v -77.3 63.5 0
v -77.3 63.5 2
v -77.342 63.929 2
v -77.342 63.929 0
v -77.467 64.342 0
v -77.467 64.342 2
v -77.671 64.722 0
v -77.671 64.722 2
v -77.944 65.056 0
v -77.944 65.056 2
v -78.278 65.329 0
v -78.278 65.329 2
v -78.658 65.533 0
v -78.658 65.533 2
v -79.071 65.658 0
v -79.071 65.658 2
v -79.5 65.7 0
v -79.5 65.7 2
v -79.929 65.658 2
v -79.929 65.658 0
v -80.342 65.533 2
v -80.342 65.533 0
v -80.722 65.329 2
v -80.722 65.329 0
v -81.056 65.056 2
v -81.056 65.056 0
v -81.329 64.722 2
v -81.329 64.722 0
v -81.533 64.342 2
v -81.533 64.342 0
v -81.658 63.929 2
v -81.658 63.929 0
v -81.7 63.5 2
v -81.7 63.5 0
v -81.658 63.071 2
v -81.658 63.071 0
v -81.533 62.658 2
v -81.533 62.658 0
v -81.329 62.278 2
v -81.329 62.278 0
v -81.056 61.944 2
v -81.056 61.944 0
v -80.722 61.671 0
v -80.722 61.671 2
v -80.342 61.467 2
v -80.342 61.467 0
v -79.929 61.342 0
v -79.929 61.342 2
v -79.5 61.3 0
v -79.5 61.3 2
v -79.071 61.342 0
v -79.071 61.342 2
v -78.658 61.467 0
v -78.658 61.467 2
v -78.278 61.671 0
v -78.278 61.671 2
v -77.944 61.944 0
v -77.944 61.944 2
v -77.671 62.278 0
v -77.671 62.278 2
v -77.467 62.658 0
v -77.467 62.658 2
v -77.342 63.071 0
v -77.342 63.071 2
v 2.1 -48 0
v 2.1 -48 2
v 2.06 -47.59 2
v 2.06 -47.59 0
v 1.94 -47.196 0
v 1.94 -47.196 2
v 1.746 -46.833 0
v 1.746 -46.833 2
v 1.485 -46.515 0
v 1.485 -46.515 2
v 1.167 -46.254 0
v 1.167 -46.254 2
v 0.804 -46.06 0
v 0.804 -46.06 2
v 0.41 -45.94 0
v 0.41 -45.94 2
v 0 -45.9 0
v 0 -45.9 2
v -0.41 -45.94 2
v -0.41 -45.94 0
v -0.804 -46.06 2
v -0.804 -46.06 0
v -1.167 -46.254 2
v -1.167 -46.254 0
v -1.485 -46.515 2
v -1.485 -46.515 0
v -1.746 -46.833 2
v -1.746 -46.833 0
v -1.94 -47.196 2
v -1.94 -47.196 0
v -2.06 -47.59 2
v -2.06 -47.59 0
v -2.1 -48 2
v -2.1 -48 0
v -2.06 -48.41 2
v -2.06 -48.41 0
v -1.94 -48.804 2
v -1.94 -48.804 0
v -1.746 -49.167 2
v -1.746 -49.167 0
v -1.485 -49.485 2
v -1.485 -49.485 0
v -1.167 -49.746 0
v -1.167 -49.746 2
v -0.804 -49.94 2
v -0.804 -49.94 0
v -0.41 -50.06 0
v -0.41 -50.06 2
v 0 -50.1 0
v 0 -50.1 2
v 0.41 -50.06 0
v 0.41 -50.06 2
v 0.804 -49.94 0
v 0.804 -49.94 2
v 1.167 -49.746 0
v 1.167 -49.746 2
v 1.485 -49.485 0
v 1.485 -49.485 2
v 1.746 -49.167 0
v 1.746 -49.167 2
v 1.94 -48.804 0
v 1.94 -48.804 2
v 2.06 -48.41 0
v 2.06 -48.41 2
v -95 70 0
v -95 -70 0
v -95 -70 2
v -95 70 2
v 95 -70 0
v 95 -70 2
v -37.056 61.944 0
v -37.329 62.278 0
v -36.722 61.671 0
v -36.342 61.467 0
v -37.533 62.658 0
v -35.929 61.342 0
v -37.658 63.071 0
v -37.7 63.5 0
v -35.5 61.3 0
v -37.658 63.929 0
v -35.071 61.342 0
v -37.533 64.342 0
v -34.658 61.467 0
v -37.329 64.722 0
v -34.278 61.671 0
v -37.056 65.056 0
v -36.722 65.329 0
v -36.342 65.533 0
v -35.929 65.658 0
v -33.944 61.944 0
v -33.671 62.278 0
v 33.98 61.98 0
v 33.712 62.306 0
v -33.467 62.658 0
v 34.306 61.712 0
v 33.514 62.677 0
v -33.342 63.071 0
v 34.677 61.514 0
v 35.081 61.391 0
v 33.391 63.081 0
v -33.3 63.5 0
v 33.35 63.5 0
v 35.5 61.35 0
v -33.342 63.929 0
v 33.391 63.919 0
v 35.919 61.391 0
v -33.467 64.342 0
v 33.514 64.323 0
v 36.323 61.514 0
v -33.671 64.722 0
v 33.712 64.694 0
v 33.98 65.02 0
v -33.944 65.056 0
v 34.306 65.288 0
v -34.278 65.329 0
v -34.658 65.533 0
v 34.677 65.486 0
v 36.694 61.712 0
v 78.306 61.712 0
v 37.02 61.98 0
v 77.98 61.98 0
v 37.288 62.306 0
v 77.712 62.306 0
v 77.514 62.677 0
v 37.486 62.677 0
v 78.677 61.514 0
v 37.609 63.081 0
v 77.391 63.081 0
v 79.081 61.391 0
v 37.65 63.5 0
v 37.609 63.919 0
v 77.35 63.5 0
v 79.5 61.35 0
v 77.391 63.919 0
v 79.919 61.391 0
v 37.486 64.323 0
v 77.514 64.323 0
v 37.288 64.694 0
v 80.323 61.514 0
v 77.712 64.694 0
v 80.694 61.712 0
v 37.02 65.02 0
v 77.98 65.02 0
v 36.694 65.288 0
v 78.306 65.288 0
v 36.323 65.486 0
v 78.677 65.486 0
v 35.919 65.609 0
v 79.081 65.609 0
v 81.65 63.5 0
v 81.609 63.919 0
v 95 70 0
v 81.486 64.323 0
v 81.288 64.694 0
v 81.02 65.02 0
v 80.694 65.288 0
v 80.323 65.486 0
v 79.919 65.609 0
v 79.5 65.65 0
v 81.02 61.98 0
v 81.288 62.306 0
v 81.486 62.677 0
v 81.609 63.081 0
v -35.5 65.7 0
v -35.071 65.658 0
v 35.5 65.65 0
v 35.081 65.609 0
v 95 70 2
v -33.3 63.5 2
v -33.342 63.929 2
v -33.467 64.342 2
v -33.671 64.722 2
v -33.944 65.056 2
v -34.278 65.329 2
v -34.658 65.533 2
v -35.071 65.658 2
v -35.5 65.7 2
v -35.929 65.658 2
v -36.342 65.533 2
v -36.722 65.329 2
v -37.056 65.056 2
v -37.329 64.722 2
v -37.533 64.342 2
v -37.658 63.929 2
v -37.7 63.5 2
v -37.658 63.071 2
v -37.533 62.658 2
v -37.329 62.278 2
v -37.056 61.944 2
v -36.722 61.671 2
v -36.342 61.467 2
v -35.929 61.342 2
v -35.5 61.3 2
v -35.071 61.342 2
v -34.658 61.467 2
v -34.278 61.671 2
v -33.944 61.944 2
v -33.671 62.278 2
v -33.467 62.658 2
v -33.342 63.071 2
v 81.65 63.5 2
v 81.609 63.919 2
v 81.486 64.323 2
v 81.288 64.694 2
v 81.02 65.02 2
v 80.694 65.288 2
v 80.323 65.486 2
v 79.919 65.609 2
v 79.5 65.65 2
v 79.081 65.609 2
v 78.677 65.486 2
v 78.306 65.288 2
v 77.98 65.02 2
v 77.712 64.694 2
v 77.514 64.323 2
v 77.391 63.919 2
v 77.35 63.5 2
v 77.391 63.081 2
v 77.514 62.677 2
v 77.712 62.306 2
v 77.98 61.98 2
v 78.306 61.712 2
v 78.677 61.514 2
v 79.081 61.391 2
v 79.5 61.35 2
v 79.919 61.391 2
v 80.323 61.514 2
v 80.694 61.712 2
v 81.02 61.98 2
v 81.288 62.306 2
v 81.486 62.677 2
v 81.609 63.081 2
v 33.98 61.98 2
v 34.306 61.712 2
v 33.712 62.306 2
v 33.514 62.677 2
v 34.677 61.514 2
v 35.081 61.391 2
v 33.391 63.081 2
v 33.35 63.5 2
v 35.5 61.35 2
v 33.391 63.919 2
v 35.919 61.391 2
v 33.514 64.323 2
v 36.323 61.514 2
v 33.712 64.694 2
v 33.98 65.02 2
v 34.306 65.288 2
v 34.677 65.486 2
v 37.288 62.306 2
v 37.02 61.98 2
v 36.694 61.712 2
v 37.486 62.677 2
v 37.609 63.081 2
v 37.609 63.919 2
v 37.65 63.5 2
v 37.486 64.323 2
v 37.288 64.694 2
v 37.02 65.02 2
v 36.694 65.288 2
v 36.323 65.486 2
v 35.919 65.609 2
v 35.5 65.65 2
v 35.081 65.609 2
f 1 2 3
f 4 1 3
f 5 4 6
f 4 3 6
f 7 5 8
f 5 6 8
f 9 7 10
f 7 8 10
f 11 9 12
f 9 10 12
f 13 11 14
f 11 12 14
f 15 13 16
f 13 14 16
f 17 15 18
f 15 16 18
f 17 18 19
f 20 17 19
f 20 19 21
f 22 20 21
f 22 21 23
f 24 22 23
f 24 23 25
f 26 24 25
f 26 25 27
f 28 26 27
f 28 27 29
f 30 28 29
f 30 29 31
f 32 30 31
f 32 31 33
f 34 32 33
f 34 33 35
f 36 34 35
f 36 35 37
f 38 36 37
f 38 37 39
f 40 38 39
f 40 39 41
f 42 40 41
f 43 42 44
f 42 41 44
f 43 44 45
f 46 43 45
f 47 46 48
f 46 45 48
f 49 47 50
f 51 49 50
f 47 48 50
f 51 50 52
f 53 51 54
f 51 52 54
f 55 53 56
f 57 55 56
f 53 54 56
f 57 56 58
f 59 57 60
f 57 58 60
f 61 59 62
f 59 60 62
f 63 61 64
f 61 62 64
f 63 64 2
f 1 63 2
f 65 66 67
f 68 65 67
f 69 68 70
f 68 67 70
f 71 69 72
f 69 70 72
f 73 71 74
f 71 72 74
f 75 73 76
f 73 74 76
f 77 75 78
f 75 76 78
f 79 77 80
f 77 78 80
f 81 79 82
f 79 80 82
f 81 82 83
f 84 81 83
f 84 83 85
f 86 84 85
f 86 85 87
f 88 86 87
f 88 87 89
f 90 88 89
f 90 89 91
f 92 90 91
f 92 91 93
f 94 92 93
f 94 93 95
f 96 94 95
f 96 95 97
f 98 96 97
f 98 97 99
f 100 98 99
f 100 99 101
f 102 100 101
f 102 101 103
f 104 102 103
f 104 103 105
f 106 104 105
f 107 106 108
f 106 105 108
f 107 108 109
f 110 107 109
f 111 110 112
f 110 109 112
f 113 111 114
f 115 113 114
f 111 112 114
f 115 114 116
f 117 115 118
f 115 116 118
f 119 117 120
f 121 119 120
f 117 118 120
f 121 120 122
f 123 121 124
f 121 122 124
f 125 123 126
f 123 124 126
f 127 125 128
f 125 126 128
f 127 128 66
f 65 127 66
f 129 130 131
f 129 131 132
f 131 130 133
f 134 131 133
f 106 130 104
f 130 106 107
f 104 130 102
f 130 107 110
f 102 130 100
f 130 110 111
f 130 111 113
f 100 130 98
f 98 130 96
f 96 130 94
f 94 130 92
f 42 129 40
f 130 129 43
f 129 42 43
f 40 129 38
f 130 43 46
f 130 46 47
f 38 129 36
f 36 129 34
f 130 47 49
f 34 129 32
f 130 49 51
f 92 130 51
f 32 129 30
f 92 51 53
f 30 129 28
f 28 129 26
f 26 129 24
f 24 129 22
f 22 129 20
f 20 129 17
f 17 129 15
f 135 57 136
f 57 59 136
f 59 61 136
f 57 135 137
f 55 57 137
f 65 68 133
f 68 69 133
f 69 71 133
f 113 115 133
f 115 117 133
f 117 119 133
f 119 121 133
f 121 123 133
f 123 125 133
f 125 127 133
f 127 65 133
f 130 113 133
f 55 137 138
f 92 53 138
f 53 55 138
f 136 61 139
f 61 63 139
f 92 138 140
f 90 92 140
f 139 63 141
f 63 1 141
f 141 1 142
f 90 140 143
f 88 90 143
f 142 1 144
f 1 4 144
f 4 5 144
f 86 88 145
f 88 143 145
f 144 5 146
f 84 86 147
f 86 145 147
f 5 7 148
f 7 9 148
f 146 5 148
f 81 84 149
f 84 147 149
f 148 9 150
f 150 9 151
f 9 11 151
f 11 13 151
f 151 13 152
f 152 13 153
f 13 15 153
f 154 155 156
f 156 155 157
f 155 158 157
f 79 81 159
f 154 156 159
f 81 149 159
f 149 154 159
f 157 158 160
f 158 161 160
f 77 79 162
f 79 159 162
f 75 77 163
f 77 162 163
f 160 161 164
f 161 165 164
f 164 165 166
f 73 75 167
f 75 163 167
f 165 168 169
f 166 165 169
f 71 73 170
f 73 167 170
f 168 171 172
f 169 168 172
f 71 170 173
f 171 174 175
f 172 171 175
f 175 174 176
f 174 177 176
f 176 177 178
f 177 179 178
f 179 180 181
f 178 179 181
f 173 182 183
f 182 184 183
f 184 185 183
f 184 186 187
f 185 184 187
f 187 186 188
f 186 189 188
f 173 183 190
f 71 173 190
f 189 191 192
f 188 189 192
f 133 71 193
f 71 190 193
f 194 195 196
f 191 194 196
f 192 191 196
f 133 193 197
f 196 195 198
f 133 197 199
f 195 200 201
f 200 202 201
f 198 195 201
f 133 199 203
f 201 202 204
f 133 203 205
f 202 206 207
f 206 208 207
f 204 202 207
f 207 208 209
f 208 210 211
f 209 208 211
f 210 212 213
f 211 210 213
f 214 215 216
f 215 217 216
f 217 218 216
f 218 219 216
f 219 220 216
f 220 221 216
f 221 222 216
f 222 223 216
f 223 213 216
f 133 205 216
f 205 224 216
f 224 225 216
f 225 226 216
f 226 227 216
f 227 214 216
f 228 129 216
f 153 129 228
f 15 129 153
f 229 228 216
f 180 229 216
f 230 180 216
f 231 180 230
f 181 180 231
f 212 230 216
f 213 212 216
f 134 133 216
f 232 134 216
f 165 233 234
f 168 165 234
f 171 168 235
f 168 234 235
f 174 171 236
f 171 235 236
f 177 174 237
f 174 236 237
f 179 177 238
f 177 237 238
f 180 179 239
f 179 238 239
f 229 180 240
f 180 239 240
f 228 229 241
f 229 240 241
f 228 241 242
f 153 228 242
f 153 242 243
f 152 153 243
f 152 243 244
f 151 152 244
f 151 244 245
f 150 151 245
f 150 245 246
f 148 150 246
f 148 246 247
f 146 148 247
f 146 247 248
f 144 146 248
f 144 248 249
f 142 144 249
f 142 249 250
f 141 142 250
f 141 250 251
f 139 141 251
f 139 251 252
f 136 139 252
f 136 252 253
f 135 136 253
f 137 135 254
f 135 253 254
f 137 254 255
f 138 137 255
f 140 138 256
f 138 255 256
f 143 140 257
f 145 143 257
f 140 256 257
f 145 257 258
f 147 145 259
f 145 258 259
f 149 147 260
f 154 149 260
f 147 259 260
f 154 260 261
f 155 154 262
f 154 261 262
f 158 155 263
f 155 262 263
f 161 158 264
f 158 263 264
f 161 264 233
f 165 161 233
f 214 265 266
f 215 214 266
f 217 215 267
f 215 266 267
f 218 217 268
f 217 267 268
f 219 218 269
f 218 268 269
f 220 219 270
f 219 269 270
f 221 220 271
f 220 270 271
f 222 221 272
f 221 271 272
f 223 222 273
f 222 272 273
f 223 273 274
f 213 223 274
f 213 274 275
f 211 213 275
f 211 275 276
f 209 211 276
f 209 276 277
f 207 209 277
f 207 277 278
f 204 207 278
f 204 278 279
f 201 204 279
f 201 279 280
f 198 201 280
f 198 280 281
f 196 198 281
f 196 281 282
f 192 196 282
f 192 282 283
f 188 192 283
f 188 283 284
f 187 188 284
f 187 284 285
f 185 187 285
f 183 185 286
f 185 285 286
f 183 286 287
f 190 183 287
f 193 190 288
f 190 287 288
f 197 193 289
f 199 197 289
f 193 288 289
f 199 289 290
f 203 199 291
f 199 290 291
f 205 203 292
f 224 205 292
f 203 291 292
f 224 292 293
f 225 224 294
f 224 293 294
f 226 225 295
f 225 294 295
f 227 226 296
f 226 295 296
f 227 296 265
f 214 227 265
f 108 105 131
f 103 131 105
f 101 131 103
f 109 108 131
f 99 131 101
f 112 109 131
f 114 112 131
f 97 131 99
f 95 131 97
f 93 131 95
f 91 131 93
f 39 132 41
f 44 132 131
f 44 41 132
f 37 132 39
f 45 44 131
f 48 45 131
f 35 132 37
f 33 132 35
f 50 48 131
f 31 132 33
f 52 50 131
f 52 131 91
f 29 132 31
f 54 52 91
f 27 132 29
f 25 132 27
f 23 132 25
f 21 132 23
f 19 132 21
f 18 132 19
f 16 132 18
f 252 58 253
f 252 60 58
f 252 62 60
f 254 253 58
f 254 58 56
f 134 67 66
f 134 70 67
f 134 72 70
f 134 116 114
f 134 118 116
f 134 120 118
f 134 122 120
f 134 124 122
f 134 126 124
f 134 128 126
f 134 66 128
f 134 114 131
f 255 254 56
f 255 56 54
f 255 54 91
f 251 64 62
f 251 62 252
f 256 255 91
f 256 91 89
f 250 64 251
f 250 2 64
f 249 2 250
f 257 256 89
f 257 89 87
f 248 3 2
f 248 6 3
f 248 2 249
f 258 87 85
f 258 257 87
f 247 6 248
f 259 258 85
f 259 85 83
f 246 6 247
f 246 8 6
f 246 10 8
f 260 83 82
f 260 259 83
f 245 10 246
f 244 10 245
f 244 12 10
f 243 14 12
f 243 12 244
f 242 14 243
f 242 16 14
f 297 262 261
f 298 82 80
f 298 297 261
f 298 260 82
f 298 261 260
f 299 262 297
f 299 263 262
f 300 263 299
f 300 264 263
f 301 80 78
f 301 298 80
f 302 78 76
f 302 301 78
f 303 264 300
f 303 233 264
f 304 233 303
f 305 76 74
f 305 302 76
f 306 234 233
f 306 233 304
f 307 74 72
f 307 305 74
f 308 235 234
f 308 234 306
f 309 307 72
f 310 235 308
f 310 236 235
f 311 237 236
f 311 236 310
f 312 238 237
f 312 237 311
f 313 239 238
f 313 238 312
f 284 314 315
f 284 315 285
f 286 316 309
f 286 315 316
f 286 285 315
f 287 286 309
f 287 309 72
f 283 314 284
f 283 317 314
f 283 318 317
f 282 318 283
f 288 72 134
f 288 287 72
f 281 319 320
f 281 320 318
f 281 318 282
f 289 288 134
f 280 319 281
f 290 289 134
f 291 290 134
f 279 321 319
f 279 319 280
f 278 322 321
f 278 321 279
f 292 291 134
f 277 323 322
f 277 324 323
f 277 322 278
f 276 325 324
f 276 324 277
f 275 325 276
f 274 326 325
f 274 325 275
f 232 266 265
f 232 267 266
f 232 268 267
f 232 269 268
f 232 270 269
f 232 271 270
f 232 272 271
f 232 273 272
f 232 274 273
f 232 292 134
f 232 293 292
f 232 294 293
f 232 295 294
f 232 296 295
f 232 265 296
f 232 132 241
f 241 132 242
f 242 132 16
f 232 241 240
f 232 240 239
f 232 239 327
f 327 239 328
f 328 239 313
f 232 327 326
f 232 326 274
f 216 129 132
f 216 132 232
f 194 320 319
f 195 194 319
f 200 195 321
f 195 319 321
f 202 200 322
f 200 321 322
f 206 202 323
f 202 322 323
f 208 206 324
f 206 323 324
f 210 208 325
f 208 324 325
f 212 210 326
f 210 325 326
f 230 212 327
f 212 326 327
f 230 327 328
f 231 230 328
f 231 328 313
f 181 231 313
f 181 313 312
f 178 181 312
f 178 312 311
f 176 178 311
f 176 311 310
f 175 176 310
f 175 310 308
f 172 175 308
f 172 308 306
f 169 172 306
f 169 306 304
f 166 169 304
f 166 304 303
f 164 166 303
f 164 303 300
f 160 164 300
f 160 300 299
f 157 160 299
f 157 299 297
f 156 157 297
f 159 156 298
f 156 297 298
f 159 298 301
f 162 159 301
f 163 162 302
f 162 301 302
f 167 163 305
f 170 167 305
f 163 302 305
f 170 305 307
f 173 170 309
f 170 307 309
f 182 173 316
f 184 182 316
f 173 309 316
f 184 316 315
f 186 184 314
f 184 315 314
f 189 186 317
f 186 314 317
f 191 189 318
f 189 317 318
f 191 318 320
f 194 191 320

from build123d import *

# Parameters (mm, degrees)
SKETCH_1_W          = 190
SKETCH_1_H          = 140
EXTRUDE_1_DEPTH     = 2
SKETCH_2_R          = 2.15
SKETCH_2_R_2        = 2.2
CUT_EXTRUDE_1_DEPTH = 10
SKETCH_3_R          = 2.1
CUT_EXTRUDE_2_DEPTH = 10


with BuildPart() as part:
    # ｽｹｯﾁ1 → ﾎﾞｽ - 押し出し1 (new body)
    with BuildSketch(Plane.XY):
        Rectangle(SKETCH_1_W, SKETCH_1_H)
    extrude(amount=EXTRUDE_1_DEPTH)

    # ｽｹｯﾁ2 → ｶｯﾄ - 押し出し1 (cut)
    with BuildSketch(Plane.XY.offset(2)):
        with Locations((35.5, 63.5)):
            Circle(SKETCH_2_R)
        with Locations((79.5, 63.5)):
            Circle(SKETCH_2_R)
        with Locations((-35.5, 63.5)):
            Circle(SKETCH_2_R_2)
        with Locations((-79.5, 63.5)):
            Circle(SKETCH_2_R_2)
    extrude(amount=-CUT_EXTRUDE_1_DEPTH, mode=Mode.SUBTRACT)

    # ｽｹｯﾁ3 → ｶｯﾄ - 押し出し2 (cut)
    with BuildSketch(Plane.XY.offset(2)):
        with Locations((0, -48)):
            Circle(SKETCH_3_R)
    extrude(amount=-CUT_EXTRUDE_2_DEPTH, mode=Mode.SUBTRACT)


solid = part.part
